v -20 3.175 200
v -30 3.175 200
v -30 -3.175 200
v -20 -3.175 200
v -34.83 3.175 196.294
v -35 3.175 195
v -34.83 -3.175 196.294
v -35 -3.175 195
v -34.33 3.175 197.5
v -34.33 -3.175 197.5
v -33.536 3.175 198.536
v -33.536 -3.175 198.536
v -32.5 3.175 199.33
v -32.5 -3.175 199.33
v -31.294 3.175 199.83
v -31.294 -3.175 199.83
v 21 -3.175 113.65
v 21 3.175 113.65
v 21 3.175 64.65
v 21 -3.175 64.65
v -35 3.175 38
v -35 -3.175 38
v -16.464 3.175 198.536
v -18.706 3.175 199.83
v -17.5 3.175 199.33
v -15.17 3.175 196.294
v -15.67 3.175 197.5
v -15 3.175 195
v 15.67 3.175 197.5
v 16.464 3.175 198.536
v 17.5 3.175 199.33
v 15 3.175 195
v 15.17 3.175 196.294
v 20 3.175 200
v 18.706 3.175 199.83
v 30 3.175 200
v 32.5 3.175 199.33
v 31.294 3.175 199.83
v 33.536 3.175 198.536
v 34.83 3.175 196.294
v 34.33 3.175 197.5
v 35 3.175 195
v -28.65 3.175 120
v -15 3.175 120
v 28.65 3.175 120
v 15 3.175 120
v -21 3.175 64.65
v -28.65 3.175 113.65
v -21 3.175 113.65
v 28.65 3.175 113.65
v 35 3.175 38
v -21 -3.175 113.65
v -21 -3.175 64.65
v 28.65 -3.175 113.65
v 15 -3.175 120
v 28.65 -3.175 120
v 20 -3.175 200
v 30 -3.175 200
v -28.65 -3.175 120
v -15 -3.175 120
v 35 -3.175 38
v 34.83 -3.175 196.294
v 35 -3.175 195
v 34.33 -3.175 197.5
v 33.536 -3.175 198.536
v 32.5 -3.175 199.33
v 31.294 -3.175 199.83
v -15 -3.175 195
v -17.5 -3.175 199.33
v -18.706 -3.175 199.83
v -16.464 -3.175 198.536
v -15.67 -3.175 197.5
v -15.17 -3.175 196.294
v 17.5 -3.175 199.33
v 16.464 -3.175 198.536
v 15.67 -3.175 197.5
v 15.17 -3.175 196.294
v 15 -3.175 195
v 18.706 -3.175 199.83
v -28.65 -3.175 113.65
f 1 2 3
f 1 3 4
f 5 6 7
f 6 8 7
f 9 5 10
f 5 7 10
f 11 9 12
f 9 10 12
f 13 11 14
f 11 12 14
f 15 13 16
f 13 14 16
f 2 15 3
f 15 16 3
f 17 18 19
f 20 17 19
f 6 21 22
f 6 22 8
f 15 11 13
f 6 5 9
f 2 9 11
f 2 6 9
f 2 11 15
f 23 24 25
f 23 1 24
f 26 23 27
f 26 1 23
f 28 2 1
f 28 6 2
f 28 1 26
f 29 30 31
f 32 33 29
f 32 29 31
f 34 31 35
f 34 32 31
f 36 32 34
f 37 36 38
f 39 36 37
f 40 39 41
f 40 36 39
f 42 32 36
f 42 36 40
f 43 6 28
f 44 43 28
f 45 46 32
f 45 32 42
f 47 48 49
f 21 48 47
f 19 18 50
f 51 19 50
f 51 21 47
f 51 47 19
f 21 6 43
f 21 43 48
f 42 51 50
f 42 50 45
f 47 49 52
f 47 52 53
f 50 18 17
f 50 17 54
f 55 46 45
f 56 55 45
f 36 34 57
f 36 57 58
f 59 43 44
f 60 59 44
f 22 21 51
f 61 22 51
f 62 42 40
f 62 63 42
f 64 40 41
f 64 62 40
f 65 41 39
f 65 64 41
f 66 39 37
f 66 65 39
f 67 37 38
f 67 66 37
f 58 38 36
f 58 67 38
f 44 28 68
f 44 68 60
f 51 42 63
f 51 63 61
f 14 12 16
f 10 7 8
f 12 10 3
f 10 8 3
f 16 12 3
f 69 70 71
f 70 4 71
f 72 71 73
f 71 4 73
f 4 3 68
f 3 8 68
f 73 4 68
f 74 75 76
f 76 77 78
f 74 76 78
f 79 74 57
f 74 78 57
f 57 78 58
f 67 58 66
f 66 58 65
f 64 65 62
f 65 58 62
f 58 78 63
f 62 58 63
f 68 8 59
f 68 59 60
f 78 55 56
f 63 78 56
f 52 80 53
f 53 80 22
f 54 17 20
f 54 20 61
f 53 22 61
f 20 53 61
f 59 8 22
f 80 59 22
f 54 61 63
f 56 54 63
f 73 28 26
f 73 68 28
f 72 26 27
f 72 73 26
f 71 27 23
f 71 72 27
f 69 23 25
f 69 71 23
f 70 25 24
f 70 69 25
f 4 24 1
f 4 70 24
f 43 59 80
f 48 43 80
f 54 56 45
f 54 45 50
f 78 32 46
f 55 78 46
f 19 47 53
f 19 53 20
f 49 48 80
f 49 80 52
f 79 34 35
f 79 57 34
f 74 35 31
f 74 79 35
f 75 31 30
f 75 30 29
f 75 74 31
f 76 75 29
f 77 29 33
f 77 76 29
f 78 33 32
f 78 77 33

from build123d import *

# Parameters (mm, degrees)
BOSS_EXTRUDE1_DEPTH = 3.175
CUT_EXTRUDE1_DEPTH  = 204.138678001
SKETCH3_W           = 42
SKETCH3_H           = 55.35
SKETCH3_W_2         = 30
SKETCH3_H_2         = 80
SKETCH3_W_3         = 7.65
SKETCH3_H_3         = 6.35
CUT_EXTRUDE2_DEPTH  = 204.138678001
FILLET3_R           = 5


with BuildPart() as part:
    # Sketch1 → Boss-Extrude1 (new, symmetric)
    with BuildSketch(Plane(origin=(0, 0, 0), x_dir=(1, 0, 0), z_dir=(0, 1, 0))):
        with BuildLine():
            Line((35, -200), (35, 0))
            ThreePointArc((35, 0), (0, 35), (-35, 0))
            Line((-35, 0), (-35, -200))
            Line((-35, -200), (35, -200))
        make_face()
    extrude(amount=BOSS_EXTRUDE1_DEPTH, both=True)

    # Sketch2 → Cut-Extrude1 (cut, through all)
    with BuildSketch(Plane(origin=(0, 3.175, 0), x_dir=(1, 0, 0), z_dir=(0, 1, 0))):
        with BuildLine():
            Line((-35, -38), (35, -38))
            Line((35, -38), (35, 0))
            ThreePointArc((35, 0), (0, 35), (-35, 0))
            Line((-35, 0), (-35, -38))
        make_face()
    extrude(amount=-CUT_EXTRUDE1_DEPTH, mode=Mode.SUBTRACT)

    # Sketch3 → Cut-Extrude2 (cut, through all)
    with BuildSketch(Plane(origin=(0, 3.175, 0), x_dir=(1, 0, 0), z_dir=(0, 1, 0))):
        with Locations((0, -92.325)):
            Rectangle(SKETCH3_W, SKETCH3_H)
        with Locations((0, -160)):
            Rectangle(SKETCH3_W_2, SKETCH3_H_2)
        with Locations((-24.825, -116.825)):
            Rectangle(SKETCH3_W_3, SKETCH3_H_3)
        with Locations((24.825, -116.825)):
            Rectangle(SKETCH3_W_3, SKETCH3_H_3)
    extrude(amount=-CUT_EXTRUDE2_DEPTH, mode=Mode.SUBTRACT)

    # Fillet3
    fillet3_edges = [part.edges().sort_by_distance(p)[0] for p in [
        (15, 0, 200),
        (-15, 0, 200),
        (35, 0, 200),
        (-35, 0, 200),
    ]]
    fillet(fillet3_edges, radius=FILLET3_R)


solid = part.part
